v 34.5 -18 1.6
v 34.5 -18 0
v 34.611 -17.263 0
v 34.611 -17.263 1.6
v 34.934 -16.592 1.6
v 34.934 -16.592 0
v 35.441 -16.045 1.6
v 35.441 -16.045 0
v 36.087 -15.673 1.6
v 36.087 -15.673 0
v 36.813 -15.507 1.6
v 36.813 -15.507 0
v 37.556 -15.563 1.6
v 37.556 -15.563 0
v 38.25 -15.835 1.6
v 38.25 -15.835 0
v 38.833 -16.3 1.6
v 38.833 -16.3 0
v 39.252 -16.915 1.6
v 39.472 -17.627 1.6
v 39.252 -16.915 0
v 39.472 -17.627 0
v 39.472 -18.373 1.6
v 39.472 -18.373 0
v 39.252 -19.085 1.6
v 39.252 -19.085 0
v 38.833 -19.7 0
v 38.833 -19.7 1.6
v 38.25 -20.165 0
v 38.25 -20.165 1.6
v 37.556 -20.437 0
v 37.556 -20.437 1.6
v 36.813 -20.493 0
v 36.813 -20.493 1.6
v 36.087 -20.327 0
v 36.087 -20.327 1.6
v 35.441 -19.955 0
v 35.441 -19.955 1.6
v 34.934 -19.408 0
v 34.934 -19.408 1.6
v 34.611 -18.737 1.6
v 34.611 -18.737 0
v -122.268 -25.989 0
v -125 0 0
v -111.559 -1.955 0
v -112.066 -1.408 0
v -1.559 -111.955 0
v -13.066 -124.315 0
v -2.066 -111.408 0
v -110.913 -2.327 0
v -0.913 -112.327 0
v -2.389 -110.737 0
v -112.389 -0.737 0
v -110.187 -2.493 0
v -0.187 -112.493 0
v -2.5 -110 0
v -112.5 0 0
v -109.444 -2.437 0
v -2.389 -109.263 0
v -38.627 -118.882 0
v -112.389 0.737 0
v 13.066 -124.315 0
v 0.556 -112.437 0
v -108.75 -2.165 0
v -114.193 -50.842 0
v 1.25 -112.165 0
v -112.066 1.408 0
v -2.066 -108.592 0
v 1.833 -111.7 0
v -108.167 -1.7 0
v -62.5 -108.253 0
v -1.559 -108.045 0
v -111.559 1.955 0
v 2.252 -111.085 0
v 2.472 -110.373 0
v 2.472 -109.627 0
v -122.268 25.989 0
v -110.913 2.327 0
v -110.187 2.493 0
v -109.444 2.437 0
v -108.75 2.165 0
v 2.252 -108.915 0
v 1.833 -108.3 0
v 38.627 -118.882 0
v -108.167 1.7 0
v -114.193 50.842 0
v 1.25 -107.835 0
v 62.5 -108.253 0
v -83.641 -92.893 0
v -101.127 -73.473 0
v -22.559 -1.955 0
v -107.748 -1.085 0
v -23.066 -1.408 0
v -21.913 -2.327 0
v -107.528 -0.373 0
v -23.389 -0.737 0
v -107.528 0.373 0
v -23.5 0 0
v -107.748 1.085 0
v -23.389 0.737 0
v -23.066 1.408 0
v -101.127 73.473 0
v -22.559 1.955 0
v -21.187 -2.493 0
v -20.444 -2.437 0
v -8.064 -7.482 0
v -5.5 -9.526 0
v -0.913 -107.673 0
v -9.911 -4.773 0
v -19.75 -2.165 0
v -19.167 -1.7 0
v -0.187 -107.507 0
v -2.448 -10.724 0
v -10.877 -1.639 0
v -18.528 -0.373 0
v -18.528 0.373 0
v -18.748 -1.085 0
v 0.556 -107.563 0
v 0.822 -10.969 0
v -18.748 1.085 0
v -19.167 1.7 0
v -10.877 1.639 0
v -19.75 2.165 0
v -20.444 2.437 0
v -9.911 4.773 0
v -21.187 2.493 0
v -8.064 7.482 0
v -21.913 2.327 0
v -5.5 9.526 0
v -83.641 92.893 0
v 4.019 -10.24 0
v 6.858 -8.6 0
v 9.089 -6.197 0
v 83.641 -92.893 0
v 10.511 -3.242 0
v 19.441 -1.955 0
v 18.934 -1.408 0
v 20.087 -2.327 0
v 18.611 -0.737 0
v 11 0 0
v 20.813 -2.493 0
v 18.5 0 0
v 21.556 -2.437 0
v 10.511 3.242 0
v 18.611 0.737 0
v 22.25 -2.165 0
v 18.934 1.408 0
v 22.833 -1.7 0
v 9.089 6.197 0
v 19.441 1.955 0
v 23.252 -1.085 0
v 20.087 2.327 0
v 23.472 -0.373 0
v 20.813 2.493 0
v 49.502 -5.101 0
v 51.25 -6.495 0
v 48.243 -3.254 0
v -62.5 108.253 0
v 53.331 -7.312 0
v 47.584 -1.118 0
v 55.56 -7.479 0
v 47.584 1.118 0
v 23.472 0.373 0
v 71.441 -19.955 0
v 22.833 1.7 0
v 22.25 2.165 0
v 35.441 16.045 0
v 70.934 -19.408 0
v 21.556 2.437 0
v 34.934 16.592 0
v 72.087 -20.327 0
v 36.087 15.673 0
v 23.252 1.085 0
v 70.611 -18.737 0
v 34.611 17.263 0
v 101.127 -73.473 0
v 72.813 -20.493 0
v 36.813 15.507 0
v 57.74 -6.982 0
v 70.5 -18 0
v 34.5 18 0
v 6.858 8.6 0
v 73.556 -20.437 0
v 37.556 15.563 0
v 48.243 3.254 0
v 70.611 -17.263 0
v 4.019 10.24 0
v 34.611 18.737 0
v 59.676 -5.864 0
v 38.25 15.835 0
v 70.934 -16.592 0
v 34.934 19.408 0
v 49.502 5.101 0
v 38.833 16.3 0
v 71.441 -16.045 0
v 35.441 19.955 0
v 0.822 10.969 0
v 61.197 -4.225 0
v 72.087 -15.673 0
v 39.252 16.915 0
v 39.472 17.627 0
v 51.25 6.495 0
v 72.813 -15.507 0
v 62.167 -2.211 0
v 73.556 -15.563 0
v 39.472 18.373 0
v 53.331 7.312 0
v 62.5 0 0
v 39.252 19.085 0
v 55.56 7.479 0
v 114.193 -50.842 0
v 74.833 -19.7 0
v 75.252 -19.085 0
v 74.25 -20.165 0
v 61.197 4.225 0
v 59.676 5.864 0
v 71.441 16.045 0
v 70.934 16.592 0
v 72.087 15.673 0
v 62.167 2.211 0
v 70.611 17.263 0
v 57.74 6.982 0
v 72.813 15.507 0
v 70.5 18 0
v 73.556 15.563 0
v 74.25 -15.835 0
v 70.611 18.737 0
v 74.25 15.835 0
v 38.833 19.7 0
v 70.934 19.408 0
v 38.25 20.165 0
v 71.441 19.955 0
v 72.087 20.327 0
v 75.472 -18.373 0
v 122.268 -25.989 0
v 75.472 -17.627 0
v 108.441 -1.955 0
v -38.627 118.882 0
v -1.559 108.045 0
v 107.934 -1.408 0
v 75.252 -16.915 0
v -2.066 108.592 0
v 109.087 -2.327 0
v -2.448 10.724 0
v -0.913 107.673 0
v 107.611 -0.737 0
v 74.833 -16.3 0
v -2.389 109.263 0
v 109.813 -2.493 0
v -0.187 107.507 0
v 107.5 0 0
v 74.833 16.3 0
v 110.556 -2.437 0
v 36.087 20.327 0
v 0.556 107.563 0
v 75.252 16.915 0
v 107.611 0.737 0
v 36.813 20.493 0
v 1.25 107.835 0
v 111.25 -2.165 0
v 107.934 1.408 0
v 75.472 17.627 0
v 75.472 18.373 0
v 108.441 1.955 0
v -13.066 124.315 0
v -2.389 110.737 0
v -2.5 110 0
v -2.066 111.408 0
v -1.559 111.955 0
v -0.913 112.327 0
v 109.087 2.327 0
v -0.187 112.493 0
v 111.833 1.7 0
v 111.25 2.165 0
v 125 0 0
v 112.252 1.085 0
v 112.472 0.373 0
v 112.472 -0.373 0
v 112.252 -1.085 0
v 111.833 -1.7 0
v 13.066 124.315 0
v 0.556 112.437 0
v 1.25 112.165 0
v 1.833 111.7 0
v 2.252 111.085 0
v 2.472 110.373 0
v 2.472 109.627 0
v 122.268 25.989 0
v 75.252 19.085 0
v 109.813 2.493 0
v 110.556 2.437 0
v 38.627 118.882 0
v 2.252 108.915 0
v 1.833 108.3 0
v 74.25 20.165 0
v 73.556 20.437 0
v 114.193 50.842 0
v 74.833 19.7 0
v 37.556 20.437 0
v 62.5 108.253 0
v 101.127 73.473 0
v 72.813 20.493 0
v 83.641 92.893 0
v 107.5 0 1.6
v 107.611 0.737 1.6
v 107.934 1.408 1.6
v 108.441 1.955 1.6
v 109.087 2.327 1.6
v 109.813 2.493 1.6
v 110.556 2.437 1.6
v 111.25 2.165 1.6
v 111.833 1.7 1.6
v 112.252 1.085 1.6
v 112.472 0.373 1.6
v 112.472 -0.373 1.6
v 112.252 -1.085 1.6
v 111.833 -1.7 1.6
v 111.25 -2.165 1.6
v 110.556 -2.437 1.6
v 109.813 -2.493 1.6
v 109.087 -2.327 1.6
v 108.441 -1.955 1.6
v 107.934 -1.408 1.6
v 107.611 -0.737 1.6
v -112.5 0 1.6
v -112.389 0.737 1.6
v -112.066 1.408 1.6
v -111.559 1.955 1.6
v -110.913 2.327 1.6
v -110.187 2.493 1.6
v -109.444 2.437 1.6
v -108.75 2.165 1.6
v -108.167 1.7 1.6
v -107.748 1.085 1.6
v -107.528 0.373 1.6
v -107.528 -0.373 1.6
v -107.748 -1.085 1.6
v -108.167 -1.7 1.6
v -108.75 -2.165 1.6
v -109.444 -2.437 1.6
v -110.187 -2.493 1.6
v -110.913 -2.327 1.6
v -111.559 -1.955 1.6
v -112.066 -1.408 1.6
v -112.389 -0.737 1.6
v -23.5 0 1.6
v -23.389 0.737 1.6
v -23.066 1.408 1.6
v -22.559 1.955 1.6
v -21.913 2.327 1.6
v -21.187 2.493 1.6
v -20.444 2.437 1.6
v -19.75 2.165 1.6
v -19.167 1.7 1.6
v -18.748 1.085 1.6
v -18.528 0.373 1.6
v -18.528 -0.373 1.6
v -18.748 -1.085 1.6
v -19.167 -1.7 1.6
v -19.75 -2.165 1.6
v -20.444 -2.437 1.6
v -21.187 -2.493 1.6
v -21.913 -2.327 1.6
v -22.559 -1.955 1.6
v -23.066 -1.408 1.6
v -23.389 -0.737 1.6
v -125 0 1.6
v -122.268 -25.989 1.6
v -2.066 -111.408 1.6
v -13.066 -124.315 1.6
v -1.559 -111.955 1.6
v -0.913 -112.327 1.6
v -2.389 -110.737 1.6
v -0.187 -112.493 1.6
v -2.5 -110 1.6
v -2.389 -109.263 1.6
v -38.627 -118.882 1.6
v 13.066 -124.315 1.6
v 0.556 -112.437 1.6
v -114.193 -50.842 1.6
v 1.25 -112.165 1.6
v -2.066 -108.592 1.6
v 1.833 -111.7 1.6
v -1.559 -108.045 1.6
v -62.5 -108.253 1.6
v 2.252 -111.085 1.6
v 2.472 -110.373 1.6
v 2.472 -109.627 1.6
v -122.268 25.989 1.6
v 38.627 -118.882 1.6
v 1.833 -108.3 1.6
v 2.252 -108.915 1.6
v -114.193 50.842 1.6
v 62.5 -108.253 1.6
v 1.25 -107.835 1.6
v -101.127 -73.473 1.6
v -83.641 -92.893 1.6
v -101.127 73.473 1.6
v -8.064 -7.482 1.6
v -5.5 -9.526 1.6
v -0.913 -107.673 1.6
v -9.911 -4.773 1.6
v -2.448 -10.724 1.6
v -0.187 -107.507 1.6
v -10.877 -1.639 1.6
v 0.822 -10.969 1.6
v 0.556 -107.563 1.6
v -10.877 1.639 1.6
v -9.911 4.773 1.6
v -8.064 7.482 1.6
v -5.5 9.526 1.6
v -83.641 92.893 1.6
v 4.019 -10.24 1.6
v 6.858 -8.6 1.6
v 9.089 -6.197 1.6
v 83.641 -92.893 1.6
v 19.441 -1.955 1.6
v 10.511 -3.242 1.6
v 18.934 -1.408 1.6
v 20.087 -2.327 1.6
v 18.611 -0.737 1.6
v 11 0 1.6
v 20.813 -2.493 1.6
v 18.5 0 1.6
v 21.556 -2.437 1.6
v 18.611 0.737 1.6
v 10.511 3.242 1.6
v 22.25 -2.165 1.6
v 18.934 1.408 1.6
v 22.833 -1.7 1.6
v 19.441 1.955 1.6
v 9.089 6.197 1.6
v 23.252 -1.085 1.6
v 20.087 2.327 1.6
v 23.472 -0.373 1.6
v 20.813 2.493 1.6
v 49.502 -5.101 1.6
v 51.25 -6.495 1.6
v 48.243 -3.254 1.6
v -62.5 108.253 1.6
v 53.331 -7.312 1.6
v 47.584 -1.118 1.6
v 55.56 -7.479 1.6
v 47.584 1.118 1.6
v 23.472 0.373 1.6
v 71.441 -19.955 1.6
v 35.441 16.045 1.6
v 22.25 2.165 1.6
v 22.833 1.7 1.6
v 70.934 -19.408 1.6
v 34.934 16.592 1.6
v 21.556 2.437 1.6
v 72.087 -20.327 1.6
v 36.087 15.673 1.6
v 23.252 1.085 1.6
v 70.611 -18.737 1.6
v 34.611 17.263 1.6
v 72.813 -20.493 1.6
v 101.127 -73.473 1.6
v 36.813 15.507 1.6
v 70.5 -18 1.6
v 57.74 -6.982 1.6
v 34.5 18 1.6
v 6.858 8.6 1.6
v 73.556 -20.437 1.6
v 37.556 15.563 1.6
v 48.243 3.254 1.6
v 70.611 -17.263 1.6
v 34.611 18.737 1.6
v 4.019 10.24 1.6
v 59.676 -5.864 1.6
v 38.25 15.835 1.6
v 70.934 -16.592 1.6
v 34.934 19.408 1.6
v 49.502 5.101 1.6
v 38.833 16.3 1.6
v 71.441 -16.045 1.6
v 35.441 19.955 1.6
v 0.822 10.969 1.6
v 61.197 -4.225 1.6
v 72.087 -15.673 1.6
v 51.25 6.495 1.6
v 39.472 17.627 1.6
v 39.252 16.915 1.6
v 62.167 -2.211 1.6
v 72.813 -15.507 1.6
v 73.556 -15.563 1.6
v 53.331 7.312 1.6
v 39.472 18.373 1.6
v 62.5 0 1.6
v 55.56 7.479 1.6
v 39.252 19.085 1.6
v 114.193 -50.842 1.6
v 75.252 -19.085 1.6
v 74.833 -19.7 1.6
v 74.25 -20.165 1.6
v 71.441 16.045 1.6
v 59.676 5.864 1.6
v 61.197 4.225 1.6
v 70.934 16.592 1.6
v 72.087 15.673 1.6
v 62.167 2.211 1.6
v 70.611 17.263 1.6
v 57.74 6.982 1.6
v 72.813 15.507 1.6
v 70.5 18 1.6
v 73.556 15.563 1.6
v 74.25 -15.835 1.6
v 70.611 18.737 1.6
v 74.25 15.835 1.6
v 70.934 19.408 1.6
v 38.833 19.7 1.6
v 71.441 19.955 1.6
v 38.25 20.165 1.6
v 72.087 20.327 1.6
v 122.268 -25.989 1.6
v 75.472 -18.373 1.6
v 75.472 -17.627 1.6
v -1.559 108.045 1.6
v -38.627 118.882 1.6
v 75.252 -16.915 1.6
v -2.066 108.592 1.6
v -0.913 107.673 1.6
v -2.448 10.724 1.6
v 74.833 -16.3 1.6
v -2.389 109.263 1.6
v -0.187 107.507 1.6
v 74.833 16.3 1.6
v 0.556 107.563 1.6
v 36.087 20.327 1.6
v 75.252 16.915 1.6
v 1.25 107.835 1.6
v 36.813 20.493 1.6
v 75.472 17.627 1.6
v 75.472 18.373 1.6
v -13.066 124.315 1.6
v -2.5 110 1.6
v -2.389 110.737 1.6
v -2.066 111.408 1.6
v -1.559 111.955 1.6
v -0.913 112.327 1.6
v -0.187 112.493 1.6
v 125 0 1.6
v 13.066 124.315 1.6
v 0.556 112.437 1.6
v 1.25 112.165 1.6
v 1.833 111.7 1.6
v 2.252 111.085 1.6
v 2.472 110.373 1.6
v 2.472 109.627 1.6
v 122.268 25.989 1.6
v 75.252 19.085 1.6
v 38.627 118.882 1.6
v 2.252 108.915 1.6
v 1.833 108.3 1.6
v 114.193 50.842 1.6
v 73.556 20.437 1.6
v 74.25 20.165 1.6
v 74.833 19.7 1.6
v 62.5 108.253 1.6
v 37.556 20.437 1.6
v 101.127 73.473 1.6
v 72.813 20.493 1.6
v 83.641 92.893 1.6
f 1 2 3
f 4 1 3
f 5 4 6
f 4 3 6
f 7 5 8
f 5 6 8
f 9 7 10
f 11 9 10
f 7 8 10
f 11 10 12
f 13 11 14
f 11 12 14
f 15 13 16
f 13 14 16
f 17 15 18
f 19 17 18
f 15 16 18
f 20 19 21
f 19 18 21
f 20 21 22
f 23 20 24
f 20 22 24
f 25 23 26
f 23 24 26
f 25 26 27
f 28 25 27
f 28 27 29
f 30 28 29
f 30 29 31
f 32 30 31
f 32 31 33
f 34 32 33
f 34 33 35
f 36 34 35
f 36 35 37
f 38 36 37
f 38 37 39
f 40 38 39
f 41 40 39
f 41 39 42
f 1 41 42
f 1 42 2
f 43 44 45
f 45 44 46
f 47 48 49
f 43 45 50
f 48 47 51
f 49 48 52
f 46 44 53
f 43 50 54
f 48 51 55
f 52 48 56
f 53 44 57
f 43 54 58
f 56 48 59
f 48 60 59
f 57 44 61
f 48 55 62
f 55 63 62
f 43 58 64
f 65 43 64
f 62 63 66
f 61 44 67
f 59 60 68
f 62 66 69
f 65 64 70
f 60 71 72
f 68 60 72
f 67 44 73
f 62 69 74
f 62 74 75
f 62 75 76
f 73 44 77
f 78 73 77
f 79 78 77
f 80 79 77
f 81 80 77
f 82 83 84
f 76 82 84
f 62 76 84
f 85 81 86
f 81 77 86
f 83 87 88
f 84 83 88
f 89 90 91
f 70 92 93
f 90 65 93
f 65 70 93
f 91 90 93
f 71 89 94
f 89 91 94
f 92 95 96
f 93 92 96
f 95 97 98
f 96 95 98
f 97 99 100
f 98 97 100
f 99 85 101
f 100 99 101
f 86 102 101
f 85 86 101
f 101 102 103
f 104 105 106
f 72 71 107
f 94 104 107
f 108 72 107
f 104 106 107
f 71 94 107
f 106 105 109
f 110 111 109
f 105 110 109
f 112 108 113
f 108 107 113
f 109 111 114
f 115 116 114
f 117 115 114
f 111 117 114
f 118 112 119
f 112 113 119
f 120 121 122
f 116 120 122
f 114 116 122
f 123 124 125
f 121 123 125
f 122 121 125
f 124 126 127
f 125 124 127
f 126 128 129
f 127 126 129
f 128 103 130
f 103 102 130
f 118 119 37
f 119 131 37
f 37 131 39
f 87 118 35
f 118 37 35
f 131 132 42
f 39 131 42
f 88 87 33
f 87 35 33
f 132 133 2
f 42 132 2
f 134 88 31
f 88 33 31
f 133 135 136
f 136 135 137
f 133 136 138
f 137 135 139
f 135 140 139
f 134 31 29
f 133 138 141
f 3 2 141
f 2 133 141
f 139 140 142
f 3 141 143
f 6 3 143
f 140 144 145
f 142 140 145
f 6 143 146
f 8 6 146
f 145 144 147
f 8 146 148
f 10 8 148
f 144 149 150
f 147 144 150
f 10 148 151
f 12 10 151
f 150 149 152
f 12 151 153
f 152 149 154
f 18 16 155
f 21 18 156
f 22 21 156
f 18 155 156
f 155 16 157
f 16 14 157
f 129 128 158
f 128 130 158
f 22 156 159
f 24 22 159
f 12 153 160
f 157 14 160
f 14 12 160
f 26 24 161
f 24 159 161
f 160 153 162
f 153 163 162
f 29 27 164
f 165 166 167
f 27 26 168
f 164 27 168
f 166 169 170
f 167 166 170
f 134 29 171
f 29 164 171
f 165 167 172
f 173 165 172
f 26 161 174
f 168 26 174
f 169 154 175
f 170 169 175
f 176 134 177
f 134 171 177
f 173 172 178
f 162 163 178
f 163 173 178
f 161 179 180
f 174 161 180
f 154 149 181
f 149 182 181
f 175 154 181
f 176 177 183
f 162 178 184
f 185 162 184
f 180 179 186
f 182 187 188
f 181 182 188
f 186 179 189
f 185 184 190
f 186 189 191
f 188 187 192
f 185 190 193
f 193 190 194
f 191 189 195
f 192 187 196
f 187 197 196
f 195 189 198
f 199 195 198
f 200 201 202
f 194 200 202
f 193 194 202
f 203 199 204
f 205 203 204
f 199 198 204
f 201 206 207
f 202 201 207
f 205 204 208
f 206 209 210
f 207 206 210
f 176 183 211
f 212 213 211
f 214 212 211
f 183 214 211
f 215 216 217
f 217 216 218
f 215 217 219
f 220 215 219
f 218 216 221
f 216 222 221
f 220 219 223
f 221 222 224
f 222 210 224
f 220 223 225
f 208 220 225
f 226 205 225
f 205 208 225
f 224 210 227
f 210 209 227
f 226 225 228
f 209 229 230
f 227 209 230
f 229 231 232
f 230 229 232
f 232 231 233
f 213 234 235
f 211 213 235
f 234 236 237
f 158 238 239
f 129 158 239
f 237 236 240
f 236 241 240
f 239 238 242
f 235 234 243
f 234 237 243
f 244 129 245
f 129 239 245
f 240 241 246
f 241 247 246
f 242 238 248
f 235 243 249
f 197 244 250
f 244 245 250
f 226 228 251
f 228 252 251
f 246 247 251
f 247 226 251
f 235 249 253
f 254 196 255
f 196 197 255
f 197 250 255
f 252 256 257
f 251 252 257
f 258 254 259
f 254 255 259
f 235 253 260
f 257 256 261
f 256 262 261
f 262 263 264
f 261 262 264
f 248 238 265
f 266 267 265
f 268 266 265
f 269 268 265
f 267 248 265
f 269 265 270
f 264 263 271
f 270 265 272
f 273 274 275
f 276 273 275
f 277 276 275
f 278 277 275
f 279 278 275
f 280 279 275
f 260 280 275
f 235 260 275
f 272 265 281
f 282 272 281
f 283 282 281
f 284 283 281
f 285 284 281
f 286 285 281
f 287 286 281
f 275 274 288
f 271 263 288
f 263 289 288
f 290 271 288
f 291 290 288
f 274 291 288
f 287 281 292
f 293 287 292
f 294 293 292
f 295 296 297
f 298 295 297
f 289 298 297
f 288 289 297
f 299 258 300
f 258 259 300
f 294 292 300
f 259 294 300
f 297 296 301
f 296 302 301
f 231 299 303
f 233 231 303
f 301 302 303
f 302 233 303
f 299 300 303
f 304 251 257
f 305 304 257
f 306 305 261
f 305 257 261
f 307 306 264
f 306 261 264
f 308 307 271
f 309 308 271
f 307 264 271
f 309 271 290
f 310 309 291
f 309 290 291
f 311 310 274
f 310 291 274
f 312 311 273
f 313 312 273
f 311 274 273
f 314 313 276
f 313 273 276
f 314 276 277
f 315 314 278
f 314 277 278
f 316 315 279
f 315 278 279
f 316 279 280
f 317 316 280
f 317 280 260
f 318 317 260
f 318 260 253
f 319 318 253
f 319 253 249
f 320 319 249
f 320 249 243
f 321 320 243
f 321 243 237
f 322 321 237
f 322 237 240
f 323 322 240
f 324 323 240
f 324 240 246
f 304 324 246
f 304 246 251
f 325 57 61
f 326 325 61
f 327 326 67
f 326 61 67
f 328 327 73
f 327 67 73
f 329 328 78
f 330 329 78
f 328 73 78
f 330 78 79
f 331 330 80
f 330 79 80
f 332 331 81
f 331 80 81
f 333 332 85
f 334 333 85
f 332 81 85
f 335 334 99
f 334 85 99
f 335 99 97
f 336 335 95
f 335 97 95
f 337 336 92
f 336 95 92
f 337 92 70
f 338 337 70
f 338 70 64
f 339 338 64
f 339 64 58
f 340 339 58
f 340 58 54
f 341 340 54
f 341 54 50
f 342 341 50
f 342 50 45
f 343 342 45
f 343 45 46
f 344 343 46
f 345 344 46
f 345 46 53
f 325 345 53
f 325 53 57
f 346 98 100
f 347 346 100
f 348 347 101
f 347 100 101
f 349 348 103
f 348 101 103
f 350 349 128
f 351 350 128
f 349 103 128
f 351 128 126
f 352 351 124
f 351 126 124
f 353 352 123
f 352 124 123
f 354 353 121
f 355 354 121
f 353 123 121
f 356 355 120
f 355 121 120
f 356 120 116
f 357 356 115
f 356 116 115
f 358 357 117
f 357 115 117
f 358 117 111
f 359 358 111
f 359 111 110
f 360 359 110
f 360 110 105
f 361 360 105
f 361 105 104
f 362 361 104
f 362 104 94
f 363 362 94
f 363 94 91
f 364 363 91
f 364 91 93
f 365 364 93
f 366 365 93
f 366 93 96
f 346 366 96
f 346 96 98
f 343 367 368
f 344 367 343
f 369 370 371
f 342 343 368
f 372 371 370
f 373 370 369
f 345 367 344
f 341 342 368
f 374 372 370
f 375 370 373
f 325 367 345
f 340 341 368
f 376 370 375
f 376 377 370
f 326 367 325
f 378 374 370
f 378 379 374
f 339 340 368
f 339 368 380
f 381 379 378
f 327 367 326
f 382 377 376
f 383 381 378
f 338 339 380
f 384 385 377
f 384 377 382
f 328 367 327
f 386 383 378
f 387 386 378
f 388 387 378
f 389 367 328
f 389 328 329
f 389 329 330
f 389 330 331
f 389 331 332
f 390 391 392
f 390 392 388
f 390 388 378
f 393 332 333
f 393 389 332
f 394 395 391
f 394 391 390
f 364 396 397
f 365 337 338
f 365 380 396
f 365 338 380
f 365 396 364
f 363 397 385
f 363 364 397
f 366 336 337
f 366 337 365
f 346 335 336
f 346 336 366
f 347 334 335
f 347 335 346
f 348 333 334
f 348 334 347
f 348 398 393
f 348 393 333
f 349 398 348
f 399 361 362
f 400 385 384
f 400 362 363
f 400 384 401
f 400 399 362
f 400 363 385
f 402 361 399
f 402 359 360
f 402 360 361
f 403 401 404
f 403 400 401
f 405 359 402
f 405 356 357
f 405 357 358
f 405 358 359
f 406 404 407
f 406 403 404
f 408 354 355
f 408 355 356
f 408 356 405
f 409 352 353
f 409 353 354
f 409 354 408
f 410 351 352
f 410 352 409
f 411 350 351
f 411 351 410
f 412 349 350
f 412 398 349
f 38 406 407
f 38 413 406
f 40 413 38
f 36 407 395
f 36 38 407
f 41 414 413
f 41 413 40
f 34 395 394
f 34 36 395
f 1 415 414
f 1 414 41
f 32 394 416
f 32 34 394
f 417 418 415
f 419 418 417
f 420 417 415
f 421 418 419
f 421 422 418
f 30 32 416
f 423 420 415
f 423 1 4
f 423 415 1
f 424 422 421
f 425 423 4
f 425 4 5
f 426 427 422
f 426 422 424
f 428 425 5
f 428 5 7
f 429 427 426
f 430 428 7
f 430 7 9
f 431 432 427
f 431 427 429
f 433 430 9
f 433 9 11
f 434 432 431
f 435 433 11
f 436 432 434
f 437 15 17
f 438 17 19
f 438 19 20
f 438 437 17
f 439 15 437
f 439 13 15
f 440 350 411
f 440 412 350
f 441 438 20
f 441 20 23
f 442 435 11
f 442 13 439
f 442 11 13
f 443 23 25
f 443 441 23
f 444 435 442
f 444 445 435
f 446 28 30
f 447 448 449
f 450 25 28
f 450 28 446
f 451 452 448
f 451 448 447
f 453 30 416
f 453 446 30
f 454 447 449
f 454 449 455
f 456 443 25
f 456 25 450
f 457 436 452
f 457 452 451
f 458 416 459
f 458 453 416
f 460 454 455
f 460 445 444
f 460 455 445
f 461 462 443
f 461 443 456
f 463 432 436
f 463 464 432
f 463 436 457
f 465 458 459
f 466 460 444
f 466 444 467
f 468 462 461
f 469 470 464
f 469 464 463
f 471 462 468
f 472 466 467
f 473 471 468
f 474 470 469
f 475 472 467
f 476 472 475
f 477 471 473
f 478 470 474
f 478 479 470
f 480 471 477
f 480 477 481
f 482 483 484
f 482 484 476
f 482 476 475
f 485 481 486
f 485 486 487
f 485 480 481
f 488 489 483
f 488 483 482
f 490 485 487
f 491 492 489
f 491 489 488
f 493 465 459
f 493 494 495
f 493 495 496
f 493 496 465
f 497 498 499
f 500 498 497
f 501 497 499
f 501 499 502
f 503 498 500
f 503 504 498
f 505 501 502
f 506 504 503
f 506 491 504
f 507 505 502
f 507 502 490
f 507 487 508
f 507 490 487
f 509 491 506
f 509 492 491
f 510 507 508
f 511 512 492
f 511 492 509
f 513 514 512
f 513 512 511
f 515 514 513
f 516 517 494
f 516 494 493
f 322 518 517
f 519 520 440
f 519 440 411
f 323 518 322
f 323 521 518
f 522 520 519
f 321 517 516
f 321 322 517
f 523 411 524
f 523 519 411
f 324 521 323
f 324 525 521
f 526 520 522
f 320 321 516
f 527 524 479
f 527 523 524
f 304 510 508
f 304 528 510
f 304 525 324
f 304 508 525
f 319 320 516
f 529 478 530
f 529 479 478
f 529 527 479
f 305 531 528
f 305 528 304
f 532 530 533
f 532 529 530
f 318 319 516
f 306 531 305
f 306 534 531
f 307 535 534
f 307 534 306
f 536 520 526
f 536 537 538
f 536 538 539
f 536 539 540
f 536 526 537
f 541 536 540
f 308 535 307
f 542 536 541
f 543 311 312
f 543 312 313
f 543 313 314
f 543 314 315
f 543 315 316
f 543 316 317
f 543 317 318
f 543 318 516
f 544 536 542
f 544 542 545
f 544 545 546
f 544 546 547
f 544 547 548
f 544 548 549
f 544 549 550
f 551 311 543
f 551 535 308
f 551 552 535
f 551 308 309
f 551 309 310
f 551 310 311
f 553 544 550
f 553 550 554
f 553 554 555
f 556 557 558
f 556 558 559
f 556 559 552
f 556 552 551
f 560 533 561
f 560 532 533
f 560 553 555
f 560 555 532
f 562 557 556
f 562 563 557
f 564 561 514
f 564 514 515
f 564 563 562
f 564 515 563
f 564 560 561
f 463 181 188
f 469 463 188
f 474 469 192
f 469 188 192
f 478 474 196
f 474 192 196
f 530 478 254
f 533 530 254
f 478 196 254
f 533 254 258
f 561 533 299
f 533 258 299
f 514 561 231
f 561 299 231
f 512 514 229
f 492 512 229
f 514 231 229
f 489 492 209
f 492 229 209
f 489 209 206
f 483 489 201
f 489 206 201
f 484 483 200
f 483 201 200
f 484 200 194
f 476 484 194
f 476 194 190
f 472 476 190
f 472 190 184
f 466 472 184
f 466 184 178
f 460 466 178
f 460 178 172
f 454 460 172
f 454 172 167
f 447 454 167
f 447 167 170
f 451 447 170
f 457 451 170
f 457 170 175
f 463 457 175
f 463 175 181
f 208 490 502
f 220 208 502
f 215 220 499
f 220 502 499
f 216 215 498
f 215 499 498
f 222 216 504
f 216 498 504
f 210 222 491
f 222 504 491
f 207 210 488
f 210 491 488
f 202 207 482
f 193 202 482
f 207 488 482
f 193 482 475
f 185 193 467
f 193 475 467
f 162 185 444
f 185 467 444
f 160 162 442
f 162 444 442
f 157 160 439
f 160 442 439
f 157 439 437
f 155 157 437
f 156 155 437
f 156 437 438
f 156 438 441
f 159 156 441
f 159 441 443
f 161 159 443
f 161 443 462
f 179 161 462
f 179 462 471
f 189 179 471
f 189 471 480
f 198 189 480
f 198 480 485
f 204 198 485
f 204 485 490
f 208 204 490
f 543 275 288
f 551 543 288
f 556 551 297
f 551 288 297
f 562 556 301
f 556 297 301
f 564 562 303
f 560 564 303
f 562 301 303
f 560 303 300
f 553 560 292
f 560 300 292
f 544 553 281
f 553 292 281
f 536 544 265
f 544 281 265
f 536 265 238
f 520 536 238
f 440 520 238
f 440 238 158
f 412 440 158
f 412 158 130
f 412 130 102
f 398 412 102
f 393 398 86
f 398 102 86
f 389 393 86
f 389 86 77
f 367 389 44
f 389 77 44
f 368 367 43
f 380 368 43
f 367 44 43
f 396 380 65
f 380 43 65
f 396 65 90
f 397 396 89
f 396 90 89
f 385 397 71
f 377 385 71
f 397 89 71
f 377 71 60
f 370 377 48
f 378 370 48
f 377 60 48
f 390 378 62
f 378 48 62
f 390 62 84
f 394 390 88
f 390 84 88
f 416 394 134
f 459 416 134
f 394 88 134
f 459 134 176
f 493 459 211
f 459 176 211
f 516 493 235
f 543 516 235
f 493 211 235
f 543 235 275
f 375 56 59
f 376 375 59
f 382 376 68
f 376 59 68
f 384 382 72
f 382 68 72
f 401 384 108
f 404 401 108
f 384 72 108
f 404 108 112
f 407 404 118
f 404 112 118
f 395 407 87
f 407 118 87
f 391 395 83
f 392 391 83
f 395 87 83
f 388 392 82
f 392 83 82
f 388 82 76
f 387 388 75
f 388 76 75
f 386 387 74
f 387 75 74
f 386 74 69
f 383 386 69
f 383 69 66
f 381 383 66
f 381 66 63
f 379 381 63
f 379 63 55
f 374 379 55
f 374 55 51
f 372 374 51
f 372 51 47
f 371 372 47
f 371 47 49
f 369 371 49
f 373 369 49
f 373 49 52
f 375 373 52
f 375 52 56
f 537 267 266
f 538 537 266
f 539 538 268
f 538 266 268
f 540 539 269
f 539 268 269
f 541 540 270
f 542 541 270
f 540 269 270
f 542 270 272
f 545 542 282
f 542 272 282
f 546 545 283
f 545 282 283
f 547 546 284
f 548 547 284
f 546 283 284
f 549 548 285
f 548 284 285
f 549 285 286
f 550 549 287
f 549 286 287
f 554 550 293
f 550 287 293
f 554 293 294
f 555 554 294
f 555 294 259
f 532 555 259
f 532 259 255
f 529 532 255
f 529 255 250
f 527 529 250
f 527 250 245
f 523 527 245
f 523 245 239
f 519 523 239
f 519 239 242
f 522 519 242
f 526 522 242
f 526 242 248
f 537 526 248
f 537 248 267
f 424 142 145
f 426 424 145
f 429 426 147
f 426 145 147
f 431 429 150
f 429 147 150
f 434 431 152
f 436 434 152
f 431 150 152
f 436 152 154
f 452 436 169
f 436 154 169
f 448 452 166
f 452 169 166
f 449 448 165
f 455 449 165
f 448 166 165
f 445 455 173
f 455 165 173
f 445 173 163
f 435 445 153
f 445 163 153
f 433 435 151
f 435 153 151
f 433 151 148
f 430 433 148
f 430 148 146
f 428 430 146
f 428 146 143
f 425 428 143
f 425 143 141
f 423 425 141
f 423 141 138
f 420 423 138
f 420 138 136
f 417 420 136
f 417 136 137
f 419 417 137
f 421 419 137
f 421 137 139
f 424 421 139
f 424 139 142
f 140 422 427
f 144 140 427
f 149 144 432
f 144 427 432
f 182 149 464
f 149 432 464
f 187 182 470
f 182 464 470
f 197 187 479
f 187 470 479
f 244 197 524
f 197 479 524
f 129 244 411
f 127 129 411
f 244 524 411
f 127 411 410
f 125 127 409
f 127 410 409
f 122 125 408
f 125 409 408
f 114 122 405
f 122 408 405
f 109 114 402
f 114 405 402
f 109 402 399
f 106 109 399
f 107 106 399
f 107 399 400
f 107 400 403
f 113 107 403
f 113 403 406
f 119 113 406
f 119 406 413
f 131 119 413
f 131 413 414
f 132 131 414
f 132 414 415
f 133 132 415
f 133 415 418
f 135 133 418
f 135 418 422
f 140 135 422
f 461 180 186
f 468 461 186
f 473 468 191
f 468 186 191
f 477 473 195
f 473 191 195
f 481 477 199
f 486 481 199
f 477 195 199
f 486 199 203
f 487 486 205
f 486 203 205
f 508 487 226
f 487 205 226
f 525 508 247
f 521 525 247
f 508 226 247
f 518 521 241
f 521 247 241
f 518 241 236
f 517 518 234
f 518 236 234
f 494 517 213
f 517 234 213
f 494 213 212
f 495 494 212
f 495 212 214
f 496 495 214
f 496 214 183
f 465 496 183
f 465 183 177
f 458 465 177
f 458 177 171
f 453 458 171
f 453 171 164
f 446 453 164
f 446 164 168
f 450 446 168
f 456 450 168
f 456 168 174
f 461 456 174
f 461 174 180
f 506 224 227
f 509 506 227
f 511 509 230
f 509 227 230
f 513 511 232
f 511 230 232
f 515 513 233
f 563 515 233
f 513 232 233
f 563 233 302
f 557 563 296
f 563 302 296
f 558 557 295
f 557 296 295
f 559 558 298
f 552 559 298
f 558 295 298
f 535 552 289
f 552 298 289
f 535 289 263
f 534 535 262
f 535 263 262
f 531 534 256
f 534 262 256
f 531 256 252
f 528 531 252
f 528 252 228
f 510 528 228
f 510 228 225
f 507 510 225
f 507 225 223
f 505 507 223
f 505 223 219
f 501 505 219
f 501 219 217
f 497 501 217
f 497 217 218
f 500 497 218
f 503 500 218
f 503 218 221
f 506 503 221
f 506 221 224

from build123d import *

# Parameters (mm, degrees)
SKETCH_1_R          = 125
EXTRUDE_1_DEPTH     = 1.6
SKETCH_2_R          = 11
CUT_EXTRUDE_1_DEPTH = 177.783935922
SKETCH_3_R          = 7.5
CUT_EXTRUDE_2_DEPTH = 177.783935922
M6X1_0_1_D          = 5
M6X1_0_2_D          = 5
M6X1_0_3_D          = 5
M6X1_0_4_D          = 5
M6X1_0_5_D          = 5
M6X1_0_6_D          = 5


with BuildPart() as part:
    # ｽｹｯﾁ1 → ﾎﾞｽ - 押し出し1 (new body)
    with BuildSketch(Plane.XY):
        Circle(SKETCH_1_R)
    extrude(amount=EXTRUDE_1_DEPTH)

    # ｽｹｯﾁ2 → ｶｯﾄ - 押し出し1 (cut, through all)
    with BuildSketch(Plane.XY.offset(1.6)):
        Circle(SKETCH_2_R)
    extrude(amount=-CUT_EXTRUDE_1_DEPTH, mode=Mode.SUBTRACT)

    # ｽｹｯﾁ3 → ｶｯﾄ - 押し出し2 (cut, through all)
    with BuildSketch(Plane.XY.offset(1.6)):
        with Locations((55, 0)):
            Circle(SKETCH_3_R)
    extrude(amount=-CUT_EXTRUDE_2_DEPTH, mode=Mode.SUBTRACT)

    # M6x1.0 ねじ穴1 (through all)
    with Locations(Plane(origin=(110, 0, 1.6), x_dir=(1, 0, 0), z_dir=(0, 0, 1))):
        with Locations((0, 0)):
            Hole(M6X1_0_1_D / 2)

    # M6x1.0 ねじ穴2 (through all)
    with Locations(Plane(origin=(-110, 0, 1.6), x_dir=(1, 0, 0), z_dir=(0, 0, 1))):
        with Locations((0, 0)):
            Hole(M6X1_0_2_D / 2)

    # M6x1.0 ねじ穴3 (through all)
    with Locations(Plane(origin=(-21, 0, 1.6), x_dir=(1, 0, 0), z_dir=(0, 0, 1))):
        with Locations((0, 0)):
            Hole(M6X1_0_3_D / 2)

    # M6x1.0 ねじ穴4 (through all)
    with Locations(Plane(origin=(21, 0, 1.6), x_dir=(1, 0, 0), z_dir=(0, 0, 1))):
        with Locations((0, 0)):
            Hole(M6X1_0_4_D / 2)

    # M6x1.0 ねじ穴5 (through all)
    with Locations(Plane(origin=(37, 18, 1.6), x_dir=(1, 0, 0), z_dir=(0, 0, 1))):
        with Locations((0, 0), (36, 0), (36, -36), (0, -36)):
            Hole(M6X1_0_5_D / 2)

    # M6x1.0 ねじ穴6 (through all)
    with Locations(Plane(origin=(0, 110, 1.6), x_dir=(1, 0, 0), z_dir=(0, 0, 1))):
        with Locations((0, 0), (0, -220)):
            Hole(M6X1_0_6_D / 2)


solid = part.part
